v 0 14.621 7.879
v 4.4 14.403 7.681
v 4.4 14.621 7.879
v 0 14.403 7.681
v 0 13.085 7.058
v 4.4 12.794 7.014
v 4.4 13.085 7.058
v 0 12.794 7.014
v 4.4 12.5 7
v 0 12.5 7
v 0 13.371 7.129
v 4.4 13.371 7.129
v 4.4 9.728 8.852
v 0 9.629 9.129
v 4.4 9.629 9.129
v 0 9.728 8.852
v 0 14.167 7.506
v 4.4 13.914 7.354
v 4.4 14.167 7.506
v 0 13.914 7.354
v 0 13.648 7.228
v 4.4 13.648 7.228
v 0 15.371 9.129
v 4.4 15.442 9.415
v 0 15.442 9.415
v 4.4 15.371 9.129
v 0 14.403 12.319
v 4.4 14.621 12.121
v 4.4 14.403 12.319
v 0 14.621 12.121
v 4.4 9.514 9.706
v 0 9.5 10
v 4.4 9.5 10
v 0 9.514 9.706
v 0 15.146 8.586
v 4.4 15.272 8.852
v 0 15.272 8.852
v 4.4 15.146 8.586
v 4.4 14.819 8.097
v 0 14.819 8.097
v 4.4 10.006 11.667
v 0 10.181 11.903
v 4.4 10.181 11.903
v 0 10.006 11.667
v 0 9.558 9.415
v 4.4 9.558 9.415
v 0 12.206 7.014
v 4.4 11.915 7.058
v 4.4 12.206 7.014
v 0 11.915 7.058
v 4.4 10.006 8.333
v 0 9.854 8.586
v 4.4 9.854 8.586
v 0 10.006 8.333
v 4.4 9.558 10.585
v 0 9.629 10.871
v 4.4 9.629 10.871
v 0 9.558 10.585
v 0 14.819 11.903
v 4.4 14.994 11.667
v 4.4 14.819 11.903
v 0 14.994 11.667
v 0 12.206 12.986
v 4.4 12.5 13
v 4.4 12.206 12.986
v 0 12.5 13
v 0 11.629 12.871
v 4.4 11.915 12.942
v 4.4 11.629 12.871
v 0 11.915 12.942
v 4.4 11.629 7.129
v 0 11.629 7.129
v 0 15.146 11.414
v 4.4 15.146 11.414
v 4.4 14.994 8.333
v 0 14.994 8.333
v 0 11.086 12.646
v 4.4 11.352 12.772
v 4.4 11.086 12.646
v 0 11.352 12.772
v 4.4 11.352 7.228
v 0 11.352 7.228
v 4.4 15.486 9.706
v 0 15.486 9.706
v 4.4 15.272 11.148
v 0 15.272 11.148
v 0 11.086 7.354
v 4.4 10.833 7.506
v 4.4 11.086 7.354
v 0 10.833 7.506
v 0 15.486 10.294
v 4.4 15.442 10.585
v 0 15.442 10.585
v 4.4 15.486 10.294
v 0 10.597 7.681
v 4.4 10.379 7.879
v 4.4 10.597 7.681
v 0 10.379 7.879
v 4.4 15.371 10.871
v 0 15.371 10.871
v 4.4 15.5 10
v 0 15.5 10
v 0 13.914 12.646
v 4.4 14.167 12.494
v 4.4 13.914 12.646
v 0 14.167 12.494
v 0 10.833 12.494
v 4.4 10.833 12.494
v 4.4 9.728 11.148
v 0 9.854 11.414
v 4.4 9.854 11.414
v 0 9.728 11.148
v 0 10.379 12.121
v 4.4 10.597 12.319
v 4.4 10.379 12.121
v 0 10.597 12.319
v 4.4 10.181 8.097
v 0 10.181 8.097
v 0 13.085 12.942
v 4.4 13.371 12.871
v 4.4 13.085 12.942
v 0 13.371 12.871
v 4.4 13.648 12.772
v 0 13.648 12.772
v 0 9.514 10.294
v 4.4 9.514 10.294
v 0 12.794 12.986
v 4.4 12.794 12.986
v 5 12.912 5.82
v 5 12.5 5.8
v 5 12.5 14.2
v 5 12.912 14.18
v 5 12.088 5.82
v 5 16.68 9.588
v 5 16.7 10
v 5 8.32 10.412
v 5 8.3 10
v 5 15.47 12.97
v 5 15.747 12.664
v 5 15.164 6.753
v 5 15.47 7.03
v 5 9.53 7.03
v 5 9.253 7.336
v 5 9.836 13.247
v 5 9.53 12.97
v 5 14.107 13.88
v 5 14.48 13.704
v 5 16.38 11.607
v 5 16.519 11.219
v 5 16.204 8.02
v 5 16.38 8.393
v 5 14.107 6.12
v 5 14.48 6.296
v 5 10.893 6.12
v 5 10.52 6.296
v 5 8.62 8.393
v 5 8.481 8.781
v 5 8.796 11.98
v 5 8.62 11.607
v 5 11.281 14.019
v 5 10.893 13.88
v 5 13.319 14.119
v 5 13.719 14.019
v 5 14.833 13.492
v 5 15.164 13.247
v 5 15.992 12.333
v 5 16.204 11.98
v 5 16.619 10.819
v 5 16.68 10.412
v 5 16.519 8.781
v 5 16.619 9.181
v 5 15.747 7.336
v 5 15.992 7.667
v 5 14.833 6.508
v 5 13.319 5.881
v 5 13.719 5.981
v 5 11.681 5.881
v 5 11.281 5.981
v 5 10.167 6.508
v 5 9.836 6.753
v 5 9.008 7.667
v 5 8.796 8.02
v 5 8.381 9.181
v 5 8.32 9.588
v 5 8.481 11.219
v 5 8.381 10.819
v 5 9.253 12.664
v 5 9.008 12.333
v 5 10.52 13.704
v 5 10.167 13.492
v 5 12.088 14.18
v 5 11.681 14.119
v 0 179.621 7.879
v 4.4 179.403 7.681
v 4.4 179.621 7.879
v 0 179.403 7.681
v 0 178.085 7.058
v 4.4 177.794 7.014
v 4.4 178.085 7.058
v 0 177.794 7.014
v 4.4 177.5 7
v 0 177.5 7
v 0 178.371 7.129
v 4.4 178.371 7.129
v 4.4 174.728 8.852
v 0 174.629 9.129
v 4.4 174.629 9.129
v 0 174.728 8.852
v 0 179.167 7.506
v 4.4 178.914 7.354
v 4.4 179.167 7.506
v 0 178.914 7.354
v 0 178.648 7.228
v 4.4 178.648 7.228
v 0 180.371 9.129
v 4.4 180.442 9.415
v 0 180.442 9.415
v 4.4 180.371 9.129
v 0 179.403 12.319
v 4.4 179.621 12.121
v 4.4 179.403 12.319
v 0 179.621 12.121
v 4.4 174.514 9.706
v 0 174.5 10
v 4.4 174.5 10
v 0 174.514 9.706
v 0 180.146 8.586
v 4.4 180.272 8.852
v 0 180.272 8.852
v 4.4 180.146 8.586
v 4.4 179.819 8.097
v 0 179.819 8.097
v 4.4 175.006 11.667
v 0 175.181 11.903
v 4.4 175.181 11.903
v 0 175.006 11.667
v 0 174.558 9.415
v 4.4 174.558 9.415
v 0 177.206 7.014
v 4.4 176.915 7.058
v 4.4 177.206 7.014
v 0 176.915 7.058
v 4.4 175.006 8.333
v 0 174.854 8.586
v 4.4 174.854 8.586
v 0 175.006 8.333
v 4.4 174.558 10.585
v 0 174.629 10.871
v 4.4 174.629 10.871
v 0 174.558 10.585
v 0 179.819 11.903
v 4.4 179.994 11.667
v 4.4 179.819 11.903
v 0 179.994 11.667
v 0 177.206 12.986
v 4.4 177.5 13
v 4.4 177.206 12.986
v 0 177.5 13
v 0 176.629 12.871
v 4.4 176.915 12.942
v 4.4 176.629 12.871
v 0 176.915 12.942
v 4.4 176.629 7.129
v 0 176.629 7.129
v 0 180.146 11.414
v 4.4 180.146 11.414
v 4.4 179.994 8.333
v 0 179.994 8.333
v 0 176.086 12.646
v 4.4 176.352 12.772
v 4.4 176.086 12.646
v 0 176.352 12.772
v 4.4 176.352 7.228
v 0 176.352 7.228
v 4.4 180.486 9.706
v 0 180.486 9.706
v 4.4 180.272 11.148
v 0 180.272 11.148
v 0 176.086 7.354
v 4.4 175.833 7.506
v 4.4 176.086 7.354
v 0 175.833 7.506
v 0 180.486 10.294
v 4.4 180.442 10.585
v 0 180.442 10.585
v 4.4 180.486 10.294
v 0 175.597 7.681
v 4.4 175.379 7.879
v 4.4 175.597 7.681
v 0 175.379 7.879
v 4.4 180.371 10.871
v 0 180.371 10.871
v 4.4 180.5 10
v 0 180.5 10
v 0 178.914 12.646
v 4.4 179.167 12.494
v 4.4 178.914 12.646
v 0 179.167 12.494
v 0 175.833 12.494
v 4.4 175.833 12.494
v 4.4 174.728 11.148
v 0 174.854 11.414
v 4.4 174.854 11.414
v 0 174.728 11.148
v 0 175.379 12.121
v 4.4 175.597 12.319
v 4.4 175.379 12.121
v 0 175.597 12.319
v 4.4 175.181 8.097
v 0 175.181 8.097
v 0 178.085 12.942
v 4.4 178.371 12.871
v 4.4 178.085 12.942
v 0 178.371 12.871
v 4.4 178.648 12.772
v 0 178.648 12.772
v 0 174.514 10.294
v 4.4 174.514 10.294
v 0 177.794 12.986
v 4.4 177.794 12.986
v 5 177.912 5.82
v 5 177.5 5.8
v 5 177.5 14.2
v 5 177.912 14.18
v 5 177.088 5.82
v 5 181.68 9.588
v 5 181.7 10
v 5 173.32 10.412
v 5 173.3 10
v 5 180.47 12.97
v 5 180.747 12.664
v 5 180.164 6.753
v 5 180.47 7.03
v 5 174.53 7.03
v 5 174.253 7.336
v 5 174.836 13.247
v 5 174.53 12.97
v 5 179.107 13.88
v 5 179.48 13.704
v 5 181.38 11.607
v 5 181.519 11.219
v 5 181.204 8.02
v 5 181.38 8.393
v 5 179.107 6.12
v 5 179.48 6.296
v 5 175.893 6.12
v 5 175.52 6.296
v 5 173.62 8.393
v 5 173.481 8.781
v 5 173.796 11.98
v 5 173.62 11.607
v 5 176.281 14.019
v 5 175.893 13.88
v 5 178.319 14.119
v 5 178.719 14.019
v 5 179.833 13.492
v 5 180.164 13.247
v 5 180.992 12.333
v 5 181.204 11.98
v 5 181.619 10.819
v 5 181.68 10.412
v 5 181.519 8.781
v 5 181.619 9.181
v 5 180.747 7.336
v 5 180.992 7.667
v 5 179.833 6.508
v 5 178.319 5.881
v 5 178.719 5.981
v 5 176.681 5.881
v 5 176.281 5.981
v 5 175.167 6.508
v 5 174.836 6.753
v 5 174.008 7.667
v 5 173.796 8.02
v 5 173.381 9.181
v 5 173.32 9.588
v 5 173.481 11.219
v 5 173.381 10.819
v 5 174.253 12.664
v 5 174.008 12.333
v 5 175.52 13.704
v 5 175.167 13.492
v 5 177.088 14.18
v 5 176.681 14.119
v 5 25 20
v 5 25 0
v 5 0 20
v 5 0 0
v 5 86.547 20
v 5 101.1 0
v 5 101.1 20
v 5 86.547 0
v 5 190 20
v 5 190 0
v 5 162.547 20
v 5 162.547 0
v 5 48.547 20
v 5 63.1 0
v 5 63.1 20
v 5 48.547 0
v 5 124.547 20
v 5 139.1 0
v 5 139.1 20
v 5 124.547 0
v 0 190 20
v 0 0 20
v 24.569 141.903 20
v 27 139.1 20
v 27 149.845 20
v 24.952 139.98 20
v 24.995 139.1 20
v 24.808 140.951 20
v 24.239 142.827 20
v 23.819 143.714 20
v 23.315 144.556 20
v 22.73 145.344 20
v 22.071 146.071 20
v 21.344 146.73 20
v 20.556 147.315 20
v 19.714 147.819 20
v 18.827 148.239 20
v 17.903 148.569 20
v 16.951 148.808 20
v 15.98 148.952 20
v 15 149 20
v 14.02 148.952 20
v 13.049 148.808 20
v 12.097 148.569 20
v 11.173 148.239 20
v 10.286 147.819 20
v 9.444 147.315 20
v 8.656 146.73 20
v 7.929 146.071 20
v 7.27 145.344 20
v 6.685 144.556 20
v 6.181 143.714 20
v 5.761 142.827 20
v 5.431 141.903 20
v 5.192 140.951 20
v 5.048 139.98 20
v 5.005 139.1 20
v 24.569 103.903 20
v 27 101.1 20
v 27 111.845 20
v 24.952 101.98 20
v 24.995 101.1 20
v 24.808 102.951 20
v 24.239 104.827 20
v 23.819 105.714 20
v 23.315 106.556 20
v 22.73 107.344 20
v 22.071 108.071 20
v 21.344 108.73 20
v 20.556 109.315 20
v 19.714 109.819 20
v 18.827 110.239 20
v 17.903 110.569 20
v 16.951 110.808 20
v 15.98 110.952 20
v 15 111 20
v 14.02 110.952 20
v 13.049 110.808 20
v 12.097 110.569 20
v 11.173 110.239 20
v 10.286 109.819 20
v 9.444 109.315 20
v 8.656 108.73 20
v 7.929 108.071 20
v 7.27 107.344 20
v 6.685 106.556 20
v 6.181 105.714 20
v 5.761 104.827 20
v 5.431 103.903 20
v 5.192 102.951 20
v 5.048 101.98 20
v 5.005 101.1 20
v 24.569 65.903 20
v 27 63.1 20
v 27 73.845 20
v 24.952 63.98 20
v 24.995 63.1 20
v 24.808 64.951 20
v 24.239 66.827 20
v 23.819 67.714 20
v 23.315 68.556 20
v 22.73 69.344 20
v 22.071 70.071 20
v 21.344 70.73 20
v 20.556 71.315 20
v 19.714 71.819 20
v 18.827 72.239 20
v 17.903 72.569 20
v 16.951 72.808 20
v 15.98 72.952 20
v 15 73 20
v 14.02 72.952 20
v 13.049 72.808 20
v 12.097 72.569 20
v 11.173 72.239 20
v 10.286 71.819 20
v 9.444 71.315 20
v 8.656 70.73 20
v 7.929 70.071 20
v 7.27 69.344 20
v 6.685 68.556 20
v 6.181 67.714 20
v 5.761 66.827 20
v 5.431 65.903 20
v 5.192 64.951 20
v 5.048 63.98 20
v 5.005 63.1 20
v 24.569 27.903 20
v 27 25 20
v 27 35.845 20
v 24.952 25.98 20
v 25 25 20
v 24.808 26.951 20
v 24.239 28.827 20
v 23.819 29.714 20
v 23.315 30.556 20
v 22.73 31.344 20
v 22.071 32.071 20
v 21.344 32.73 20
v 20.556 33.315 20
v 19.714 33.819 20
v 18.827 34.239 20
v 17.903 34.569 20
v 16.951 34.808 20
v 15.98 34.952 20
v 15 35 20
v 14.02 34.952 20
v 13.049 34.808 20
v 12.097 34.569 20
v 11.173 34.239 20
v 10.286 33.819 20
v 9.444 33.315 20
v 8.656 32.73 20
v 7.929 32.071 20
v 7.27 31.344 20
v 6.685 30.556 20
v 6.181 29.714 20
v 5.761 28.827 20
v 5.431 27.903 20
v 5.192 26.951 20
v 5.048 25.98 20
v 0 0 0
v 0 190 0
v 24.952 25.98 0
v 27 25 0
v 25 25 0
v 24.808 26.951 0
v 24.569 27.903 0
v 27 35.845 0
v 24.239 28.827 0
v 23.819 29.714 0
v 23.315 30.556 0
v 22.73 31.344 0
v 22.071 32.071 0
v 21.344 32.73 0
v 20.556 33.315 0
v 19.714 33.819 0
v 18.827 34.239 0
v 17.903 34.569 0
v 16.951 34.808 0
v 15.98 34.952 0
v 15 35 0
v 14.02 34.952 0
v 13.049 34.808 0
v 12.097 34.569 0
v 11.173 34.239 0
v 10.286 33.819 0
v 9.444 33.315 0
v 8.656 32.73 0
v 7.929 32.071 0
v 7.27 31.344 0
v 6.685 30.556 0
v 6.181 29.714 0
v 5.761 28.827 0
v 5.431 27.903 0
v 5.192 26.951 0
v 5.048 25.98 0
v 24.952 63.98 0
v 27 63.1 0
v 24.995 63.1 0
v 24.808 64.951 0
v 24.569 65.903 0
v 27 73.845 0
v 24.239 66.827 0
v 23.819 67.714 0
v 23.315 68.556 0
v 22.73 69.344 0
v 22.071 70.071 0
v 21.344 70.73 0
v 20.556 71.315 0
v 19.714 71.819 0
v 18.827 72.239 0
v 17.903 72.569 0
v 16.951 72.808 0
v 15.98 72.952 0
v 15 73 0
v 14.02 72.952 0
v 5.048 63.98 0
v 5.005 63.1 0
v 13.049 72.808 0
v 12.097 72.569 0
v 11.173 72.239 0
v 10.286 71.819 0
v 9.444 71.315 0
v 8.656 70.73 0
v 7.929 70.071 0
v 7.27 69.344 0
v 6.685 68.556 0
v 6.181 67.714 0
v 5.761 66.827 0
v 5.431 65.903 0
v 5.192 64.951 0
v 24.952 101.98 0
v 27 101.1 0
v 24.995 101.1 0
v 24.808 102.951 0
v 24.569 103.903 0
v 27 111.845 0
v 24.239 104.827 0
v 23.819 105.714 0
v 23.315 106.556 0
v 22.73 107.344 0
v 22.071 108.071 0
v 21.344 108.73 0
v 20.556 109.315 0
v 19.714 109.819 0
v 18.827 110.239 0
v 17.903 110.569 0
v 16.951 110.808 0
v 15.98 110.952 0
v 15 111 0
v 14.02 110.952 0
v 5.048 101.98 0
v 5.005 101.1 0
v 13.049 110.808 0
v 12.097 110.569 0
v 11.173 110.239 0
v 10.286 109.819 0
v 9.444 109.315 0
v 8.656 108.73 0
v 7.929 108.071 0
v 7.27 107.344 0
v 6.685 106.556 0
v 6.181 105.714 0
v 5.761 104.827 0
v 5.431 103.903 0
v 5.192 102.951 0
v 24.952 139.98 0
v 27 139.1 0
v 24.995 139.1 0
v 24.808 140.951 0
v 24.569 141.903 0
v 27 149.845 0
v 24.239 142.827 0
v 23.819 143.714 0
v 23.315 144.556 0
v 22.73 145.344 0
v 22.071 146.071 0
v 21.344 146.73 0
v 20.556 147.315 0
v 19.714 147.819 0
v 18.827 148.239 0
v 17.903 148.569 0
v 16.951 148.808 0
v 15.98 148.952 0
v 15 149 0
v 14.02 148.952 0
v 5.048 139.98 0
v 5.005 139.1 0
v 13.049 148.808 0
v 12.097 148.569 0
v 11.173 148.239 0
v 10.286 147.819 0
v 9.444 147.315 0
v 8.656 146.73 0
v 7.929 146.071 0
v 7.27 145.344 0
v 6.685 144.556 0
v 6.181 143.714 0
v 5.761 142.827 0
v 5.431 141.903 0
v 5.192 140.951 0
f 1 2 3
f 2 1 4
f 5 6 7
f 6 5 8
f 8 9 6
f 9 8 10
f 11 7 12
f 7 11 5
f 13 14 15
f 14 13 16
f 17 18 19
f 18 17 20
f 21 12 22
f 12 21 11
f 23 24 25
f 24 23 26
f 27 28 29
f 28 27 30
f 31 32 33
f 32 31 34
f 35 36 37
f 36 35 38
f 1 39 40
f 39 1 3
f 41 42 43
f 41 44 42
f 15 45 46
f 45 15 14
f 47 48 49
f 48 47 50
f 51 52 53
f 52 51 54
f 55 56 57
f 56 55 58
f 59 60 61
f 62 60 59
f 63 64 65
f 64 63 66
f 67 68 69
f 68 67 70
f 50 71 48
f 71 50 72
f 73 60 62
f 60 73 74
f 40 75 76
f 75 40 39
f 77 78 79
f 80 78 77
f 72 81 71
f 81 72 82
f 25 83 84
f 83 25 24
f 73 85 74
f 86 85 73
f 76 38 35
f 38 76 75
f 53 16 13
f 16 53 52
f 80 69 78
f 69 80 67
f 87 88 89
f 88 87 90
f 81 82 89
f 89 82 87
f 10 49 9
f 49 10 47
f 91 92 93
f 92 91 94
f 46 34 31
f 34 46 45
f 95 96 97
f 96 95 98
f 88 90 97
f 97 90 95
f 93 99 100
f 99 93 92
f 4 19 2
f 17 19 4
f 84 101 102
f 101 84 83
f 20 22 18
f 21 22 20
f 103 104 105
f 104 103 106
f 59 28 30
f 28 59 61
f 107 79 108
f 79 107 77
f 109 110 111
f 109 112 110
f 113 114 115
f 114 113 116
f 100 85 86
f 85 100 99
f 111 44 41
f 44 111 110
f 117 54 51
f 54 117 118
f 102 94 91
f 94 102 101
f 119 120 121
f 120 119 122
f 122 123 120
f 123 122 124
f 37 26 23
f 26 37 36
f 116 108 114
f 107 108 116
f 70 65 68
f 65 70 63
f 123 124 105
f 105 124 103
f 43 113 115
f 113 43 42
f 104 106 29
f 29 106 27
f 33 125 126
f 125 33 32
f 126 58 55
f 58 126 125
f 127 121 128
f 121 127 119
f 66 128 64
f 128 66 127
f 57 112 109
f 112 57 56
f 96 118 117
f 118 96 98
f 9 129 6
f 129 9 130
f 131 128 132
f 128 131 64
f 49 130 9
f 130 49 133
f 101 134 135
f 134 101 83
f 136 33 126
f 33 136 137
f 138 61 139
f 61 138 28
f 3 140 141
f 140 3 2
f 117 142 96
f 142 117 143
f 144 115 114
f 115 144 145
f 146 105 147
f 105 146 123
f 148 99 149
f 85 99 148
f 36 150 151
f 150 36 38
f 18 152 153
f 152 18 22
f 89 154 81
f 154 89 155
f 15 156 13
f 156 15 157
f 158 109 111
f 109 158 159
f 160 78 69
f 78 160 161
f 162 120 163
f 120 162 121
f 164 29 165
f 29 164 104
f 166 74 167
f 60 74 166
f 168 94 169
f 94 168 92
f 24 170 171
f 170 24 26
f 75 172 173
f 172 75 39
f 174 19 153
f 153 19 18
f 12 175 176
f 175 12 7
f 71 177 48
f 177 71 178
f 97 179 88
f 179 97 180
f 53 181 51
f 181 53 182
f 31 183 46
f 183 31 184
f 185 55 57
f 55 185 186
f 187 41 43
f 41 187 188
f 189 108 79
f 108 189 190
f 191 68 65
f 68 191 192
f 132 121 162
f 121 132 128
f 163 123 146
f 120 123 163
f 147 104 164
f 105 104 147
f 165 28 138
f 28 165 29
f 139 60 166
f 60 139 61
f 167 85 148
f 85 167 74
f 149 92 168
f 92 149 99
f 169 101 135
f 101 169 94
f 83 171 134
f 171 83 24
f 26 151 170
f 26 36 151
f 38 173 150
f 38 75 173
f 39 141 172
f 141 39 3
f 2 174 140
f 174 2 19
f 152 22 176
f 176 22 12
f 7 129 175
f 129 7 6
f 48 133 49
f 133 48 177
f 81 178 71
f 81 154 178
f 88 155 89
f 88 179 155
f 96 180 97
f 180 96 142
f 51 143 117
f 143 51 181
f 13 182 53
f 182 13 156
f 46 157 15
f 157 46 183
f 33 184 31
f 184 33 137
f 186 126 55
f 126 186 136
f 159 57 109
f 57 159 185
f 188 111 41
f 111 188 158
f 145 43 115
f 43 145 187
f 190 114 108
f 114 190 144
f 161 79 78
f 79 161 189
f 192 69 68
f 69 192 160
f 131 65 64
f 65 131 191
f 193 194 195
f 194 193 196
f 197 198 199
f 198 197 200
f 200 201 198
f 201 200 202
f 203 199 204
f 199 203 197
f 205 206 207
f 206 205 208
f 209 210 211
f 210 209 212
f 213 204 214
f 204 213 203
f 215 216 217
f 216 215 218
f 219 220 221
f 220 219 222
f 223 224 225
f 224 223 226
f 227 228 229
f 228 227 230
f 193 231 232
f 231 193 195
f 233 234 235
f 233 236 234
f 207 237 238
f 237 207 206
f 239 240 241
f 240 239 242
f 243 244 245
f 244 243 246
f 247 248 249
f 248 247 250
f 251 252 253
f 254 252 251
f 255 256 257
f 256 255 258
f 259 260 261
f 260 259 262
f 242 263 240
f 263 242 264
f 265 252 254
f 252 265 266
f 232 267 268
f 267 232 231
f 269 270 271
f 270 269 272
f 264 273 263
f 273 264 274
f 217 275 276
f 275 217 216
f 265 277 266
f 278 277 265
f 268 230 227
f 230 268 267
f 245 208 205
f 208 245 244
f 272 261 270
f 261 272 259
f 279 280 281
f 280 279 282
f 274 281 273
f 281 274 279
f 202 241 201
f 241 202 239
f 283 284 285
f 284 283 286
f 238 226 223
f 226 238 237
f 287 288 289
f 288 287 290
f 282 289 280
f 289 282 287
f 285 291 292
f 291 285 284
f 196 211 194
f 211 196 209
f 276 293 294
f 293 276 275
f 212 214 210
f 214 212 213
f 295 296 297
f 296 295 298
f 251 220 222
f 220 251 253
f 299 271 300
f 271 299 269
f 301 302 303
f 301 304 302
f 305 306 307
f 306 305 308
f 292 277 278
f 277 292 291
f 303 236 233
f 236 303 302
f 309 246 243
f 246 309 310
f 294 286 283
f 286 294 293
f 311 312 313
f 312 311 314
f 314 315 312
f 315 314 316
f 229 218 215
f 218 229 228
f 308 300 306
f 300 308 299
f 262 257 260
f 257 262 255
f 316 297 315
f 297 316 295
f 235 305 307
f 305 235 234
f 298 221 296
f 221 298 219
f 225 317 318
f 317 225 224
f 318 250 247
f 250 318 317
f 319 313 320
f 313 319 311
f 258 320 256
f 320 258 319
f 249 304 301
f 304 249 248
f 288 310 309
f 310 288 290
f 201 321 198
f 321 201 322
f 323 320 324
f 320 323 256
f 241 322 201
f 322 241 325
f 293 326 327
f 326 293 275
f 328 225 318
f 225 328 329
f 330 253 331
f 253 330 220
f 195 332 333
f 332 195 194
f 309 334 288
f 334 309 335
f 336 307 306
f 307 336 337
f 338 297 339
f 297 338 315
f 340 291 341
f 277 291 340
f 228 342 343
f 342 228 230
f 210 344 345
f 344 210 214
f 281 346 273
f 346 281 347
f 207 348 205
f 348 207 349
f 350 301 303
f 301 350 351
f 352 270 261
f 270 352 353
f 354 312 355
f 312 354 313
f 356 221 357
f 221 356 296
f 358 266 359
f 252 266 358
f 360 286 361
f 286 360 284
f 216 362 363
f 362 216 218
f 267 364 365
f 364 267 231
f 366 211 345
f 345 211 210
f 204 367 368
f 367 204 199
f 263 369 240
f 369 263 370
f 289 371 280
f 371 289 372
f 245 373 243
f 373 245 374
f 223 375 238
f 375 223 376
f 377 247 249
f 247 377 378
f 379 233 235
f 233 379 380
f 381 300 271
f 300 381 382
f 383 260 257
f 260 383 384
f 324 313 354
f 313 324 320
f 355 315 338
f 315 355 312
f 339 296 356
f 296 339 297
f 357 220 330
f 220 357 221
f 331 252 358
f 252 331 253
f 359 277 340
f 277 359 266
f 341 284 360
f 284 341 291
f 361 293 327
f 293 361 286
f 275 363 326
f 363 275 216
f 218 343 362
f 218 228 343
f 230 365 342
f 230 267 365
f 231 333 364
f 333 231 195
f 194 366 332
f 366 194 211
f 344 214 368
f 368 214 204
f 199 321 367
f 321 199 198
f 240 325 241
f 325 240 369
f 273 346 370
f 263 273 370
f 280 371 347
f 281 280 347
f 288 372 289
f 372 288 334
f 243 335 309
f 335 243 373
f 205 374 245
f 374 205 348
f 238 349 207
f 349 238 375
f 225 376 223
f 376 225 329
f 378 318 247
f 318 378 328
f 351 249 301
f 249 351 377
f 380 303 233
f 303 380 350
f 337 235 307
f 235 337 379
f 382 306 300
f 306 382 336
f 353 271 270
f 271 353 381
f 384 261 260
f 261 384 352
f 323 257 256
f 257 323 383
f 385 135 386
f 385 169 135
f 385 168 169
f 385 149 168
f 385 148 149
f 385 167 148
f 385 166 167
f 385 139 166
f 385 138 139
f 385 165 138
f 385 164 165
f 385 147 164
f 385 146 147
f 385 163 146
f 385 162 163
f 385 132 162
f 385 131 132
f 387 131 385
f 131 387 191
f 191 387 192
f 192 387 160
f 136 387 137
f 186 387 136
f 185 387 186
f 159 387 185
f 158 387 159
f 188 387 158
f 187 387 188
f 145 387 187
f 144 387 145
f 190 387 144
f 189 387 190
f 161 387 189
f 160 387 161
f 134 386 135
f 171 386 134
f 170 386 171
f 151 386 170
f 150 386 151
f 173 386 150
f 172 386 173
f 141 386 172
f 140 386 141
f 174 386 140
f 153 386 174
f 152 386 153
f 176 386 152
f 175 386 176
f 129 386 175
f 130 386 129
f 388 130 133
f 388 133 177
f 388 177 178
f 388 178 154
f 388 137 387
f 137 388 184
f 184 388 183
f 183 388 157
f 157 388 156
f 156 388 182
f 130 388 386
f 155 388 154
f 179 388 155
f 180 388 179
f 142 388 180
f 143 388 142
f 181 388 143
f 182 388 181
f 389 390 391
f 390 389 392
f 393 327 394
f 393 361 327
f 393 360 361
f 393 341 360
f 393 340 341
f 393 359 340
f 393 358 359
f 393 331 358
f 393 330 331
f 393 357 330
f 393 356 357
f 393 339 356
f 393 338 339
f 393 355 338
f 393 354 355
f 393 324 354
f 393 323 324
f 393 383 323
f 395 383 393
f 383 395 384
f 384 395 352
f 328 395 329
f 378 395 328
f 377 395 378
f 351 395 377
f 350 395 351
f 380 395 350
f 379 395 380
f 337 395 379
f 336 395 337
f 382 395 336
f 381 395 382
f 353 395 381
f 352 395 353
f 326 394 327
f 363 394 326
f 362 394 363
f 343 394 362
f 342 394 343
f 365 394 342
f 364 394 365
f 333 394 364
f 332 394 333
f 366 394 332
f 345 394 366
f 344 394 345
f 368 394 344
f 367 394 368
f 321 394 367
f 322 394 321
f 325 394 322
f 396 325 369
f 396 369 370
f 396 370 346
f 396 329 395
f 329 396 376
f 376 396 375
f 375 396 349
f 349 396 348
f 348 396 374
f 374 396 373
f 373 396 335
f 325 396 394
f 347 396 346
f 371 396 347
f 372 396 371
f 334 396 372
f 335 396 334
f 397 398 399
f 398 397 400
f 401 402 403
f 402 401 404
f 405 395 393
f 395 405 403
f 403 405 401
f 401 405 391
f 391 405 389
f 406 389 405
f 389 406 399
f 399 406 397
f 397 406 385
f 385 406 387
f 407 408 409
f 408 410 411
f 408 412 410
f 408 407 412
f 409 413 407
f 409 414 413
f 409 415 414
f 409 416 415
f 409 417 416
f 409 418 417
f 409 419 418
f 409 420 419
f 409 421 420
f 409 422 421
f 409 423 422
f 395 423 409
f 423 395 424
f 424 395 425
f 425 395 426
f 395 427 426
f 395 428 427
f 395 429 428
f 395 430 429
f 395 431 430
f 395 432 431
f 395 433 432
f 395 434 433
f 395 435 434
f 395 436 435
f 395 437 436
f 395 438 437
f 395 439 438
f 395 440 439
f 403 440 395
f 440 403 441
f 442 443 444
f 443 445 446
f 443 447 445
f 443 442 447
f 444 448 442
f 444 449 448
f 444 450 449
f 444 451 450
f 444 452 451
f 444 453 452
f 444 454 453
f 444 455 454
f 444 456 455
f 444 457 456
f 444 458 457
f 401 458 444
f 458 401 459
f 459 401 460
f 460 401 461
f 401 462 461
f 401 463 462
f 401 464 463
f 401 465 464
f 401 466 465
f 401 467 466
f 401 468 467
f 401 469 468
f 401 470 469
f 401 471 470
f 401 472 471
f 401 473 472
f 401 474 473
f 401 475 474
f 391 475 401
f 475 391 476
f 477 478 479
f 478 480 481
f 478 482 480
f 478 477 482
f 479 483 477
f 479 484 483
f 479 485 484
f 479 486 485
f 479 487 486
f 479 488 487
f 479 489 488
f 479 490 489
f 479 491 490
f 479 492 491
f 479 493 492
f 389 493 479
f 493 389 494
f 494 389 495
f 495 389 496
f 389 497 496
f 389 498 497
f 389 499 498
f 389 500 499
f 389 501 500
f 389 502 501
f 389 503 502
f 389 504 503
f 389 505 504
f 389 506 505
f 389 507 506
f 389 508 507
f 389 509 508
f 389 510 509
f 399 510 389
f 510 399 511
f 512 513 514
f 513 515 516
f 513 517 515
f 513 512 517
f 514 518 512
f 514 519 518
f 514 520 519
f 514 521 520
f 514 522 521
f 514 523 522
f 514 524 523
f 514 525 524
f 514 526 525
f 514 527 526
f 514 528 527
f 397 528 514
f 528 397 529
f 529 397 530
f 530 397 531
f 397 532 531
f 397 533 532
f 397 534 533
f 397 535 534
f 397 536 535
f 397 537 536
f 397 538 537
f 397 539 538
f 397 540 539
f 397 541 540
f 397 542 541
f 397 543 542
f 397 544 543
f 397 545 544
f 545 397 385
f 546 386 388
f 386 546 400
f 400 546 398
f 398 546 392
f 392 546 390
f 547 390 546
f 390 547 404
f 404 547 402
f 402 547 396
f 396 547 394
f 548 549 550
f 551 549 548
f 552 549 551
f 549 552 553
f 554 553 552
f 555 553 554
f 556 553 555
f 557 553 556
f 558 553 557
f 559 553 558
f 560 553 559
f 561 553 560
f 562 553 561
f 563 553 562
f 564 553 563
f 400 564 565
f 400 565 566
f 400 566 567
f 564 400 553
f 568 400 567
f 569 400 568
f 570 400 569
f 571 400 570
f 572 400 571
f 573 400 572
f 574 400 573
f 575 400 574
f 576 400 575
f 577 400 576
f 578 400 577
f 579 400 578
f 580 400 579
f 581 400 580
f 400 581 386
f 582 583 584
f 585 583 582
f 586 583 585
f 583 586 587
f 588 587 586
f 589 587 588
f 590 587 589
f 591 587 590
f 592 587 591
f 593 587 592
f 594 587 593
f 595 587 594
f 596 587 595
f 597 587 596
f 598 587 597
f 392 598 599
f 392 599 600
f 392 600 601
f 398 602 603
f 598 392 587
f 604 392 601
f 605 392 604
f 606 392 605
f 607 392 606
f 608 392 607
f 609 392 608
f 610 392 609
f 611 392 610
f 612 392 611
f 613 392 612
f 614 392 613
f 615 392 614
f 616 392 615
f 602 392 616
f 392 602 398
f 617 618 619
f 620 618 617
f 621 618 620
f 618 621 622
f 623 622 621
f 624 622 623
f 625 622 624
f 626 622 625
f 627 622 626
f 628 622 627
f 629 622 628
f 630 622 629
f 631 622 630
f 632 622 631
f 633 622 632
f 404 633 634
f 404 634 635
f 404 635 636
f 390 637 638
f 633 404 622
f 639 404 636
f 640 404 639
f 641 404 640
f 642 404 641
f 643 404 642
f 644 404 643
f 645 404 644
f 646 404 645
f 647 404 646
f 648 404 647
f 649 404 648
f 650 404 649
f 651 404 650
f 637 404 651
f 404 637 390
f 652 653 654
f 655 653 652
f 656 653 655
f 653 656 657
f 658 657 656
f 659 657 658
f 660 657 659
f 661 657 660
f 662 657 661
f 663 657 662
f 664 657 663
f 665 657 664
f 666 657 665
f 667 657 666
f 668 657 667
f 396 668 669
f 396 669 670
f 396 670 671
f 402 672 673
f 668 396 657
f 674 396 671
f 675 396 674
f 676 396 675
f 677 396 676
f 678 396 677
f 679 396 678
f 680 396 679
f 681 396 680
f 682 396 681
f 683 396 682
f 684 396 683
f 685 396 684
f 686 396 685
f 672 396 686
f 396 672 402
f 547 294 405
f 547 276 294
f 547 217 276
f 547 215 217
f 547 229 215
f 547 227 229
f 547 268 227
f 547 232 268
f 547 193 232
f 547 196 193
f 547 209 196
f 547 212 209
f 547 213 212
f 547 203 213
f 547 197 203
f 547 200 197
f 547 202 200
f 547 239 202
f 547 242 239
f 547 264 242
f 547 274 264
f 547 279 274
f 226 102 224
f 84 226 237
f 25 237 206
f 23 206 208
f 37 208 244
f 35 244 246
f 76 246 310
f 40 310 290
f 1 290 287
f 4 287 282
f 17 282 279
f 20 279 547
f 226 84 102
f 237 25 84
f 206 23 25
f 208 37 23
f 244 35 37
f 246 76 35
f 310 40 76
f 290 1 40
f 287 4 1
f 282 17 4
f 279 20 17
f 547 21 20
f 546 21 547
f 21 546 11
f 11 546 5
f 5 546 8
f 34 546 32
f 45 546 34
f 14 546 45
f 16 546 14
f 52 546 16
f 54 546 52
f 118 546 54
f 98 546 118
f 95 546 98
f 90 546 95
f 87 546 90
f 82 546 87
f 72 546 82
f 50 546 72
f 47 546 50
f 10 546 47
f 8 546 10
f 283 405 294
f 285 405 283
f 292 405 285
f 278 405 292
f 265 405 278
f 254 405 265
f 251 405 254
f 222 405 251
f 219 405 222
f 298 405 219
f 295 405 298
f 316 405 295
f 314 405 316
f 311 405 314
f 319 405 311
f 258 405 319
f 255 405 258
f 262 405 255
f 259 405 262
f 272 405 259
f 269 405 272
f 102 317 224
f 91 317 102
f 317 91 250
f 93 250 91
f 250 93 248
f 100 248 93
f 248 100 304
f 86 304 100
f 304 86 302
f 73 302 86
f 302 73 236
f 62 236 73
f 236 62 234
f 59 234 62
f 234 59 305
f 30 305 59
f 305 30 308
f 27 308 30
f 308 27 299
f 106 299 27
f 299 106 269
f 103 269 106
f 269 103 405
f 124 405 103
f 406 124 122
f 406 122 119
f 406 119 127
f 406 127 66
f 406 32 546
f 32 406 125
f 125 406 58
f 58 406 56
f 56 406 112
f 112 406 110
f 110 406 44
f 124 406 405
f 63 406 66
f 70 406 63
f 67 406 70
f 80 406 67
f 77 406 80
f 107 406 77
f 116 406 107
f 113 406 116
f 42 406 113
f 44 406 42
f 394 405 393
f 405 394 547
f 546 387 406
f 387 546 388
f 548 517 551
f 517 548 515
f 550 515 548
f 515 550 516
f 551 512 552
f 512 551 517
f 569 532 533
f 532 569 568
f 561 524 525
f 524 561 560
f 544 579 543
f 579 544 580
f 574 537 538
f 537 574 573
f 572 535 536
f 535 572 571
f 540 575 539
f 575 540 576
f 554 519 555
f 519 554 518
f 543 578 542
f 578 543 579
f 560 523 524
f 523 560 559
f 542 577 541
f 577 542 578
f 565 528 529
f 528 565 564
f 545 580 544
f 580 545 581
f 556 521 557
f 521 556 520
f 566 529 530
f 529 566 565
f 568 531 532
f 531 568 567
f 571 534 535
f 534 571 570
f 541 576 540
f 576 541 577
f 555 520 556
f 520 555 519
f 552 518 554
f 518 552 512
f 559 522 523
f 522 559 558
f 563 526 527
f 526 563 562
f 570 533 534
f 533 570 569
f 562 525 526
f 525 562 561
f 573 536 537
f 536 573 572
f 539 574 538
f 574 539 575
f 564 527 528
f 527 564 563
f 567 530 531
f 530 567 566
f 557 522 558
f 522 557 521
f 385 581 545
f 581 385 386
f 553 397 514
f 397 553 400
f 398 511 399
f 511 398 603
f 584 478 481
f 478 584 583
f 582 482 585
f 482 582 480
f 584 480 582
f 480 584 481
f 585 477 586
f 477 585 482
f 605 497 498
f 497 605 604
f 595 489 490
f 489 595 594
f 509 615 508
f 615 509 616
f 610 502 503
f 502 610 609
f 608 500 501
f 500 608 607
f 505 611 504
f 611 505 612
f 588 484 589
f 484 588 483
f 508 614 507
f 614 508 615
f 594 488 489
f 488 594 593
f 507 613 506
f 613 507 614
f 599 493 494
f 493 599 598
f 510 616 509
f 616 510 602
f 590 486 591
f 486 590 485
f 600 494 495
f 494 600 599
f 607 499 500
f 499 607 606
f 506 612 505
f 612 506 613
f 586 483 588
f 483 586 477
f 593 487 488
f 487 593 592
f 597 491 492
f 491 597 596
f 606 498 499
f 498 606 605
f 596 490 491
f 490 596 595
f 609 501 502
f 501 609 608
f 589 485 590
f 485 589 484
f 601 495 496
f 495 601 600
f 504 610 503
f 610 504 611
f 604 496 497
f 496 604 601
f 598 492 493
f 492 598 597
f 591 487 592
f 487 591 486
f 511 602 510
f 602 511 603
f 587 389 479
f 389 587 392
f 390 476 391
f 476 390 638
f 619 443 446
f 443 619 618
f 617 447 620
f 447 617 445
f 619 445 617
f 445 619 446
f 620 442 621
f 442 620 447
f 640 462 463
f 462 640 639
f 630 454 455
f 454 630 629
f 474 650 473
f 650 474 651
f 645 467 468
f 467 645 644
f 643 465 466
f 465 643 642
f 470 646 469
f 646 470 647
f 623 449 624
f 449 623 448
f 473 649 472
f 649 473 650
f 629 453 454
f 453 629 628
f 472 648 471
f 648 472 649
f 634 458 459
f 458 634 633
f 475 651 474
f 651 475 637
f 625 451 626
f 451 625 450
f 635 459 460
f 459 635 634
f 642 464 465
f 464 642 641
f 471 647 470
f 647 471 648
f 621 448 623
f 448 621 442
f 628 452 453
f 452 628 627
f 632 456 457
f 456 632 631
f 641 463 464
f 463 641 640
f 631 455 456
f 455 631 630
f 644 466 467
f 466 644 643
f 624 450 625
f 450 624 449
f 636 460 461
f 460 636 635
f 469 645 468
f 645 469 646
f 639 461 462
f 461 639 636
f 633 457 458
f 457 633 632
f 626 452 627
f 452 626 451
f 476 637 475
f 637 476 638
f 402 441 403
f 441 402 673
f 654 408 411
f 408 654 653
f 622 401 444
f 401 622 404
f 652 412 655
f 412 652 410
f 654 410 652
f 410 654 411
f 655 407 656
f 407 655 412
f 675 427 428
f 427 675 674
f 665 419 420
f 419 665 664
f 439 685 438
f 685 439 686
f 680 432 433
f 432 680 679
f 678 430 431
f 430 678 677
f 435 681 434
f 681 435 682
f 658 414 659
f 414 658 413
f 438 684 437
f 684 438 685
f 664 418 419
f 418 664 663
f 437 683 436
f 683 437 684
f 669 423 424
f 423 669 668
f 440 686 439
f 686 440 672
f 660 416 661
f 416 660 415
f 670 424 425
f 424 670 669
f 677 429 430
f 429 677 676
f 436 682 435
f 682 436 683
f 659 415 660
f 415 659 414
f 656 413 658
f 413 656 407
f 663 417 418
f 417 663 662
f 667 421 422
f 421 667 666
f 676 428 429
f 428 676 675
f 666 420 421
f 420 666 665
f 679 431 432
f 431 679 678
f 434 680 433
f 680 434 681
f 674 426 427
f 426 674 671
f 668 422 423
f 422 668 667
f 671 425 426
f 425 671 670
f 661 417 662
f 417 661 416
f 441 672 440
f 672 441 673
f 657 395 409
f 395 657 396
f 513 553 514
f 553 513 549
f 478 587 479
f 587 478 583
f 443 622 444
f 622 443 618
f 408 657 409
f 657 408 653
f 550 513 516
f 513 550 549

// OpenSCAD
$fn=64;
L=190;     //длина планки
H=5;       //толщина планки
td=20;     //диаметр под трубу

xd=38;     // расстояние между трубками
dd=25;     //расстояние от края до отверстий
N=5;       //количество труб
w=20;      //ширина упора

difference(){
    cube([H,L,w]);
    translate([-0.1,dd/2,w/2])rotate([0,90,0]){
        cylinder(r=3,h=H+0.2);
        translate([0,0,H-2])cylinder(r1=0,r2=5,h=2.5);
        }
    translate([-0.1,L-dd/2,w/2])rotate([0,90,0]){
        cylinder(r=3,h=H+0.2);
        translate([0,0,H-2])cylinder(r1=0,r2=5,h=2.5);
        }
}
difference(){
    translate([H,dd,0])cube([td+2,L-dd*2,w]);
    for (i=[0:N-1]){
        translate([H+td/2,dd+i*xd,-0.1])cylinder(d=td,h=w+0.2);
       hull(){
           translate([H,(td/sin(60))/2+dd+td/2+2+i*xd,-0.1])rotate([0,0,-30])cube([td/sin(60)+2.1+1,0.2,w+0.2]);
           translate([H,dd+(i+1)*xd,-0.1])cube([td+2.1,0.1,w+0.2]);
       }
    }  
}
